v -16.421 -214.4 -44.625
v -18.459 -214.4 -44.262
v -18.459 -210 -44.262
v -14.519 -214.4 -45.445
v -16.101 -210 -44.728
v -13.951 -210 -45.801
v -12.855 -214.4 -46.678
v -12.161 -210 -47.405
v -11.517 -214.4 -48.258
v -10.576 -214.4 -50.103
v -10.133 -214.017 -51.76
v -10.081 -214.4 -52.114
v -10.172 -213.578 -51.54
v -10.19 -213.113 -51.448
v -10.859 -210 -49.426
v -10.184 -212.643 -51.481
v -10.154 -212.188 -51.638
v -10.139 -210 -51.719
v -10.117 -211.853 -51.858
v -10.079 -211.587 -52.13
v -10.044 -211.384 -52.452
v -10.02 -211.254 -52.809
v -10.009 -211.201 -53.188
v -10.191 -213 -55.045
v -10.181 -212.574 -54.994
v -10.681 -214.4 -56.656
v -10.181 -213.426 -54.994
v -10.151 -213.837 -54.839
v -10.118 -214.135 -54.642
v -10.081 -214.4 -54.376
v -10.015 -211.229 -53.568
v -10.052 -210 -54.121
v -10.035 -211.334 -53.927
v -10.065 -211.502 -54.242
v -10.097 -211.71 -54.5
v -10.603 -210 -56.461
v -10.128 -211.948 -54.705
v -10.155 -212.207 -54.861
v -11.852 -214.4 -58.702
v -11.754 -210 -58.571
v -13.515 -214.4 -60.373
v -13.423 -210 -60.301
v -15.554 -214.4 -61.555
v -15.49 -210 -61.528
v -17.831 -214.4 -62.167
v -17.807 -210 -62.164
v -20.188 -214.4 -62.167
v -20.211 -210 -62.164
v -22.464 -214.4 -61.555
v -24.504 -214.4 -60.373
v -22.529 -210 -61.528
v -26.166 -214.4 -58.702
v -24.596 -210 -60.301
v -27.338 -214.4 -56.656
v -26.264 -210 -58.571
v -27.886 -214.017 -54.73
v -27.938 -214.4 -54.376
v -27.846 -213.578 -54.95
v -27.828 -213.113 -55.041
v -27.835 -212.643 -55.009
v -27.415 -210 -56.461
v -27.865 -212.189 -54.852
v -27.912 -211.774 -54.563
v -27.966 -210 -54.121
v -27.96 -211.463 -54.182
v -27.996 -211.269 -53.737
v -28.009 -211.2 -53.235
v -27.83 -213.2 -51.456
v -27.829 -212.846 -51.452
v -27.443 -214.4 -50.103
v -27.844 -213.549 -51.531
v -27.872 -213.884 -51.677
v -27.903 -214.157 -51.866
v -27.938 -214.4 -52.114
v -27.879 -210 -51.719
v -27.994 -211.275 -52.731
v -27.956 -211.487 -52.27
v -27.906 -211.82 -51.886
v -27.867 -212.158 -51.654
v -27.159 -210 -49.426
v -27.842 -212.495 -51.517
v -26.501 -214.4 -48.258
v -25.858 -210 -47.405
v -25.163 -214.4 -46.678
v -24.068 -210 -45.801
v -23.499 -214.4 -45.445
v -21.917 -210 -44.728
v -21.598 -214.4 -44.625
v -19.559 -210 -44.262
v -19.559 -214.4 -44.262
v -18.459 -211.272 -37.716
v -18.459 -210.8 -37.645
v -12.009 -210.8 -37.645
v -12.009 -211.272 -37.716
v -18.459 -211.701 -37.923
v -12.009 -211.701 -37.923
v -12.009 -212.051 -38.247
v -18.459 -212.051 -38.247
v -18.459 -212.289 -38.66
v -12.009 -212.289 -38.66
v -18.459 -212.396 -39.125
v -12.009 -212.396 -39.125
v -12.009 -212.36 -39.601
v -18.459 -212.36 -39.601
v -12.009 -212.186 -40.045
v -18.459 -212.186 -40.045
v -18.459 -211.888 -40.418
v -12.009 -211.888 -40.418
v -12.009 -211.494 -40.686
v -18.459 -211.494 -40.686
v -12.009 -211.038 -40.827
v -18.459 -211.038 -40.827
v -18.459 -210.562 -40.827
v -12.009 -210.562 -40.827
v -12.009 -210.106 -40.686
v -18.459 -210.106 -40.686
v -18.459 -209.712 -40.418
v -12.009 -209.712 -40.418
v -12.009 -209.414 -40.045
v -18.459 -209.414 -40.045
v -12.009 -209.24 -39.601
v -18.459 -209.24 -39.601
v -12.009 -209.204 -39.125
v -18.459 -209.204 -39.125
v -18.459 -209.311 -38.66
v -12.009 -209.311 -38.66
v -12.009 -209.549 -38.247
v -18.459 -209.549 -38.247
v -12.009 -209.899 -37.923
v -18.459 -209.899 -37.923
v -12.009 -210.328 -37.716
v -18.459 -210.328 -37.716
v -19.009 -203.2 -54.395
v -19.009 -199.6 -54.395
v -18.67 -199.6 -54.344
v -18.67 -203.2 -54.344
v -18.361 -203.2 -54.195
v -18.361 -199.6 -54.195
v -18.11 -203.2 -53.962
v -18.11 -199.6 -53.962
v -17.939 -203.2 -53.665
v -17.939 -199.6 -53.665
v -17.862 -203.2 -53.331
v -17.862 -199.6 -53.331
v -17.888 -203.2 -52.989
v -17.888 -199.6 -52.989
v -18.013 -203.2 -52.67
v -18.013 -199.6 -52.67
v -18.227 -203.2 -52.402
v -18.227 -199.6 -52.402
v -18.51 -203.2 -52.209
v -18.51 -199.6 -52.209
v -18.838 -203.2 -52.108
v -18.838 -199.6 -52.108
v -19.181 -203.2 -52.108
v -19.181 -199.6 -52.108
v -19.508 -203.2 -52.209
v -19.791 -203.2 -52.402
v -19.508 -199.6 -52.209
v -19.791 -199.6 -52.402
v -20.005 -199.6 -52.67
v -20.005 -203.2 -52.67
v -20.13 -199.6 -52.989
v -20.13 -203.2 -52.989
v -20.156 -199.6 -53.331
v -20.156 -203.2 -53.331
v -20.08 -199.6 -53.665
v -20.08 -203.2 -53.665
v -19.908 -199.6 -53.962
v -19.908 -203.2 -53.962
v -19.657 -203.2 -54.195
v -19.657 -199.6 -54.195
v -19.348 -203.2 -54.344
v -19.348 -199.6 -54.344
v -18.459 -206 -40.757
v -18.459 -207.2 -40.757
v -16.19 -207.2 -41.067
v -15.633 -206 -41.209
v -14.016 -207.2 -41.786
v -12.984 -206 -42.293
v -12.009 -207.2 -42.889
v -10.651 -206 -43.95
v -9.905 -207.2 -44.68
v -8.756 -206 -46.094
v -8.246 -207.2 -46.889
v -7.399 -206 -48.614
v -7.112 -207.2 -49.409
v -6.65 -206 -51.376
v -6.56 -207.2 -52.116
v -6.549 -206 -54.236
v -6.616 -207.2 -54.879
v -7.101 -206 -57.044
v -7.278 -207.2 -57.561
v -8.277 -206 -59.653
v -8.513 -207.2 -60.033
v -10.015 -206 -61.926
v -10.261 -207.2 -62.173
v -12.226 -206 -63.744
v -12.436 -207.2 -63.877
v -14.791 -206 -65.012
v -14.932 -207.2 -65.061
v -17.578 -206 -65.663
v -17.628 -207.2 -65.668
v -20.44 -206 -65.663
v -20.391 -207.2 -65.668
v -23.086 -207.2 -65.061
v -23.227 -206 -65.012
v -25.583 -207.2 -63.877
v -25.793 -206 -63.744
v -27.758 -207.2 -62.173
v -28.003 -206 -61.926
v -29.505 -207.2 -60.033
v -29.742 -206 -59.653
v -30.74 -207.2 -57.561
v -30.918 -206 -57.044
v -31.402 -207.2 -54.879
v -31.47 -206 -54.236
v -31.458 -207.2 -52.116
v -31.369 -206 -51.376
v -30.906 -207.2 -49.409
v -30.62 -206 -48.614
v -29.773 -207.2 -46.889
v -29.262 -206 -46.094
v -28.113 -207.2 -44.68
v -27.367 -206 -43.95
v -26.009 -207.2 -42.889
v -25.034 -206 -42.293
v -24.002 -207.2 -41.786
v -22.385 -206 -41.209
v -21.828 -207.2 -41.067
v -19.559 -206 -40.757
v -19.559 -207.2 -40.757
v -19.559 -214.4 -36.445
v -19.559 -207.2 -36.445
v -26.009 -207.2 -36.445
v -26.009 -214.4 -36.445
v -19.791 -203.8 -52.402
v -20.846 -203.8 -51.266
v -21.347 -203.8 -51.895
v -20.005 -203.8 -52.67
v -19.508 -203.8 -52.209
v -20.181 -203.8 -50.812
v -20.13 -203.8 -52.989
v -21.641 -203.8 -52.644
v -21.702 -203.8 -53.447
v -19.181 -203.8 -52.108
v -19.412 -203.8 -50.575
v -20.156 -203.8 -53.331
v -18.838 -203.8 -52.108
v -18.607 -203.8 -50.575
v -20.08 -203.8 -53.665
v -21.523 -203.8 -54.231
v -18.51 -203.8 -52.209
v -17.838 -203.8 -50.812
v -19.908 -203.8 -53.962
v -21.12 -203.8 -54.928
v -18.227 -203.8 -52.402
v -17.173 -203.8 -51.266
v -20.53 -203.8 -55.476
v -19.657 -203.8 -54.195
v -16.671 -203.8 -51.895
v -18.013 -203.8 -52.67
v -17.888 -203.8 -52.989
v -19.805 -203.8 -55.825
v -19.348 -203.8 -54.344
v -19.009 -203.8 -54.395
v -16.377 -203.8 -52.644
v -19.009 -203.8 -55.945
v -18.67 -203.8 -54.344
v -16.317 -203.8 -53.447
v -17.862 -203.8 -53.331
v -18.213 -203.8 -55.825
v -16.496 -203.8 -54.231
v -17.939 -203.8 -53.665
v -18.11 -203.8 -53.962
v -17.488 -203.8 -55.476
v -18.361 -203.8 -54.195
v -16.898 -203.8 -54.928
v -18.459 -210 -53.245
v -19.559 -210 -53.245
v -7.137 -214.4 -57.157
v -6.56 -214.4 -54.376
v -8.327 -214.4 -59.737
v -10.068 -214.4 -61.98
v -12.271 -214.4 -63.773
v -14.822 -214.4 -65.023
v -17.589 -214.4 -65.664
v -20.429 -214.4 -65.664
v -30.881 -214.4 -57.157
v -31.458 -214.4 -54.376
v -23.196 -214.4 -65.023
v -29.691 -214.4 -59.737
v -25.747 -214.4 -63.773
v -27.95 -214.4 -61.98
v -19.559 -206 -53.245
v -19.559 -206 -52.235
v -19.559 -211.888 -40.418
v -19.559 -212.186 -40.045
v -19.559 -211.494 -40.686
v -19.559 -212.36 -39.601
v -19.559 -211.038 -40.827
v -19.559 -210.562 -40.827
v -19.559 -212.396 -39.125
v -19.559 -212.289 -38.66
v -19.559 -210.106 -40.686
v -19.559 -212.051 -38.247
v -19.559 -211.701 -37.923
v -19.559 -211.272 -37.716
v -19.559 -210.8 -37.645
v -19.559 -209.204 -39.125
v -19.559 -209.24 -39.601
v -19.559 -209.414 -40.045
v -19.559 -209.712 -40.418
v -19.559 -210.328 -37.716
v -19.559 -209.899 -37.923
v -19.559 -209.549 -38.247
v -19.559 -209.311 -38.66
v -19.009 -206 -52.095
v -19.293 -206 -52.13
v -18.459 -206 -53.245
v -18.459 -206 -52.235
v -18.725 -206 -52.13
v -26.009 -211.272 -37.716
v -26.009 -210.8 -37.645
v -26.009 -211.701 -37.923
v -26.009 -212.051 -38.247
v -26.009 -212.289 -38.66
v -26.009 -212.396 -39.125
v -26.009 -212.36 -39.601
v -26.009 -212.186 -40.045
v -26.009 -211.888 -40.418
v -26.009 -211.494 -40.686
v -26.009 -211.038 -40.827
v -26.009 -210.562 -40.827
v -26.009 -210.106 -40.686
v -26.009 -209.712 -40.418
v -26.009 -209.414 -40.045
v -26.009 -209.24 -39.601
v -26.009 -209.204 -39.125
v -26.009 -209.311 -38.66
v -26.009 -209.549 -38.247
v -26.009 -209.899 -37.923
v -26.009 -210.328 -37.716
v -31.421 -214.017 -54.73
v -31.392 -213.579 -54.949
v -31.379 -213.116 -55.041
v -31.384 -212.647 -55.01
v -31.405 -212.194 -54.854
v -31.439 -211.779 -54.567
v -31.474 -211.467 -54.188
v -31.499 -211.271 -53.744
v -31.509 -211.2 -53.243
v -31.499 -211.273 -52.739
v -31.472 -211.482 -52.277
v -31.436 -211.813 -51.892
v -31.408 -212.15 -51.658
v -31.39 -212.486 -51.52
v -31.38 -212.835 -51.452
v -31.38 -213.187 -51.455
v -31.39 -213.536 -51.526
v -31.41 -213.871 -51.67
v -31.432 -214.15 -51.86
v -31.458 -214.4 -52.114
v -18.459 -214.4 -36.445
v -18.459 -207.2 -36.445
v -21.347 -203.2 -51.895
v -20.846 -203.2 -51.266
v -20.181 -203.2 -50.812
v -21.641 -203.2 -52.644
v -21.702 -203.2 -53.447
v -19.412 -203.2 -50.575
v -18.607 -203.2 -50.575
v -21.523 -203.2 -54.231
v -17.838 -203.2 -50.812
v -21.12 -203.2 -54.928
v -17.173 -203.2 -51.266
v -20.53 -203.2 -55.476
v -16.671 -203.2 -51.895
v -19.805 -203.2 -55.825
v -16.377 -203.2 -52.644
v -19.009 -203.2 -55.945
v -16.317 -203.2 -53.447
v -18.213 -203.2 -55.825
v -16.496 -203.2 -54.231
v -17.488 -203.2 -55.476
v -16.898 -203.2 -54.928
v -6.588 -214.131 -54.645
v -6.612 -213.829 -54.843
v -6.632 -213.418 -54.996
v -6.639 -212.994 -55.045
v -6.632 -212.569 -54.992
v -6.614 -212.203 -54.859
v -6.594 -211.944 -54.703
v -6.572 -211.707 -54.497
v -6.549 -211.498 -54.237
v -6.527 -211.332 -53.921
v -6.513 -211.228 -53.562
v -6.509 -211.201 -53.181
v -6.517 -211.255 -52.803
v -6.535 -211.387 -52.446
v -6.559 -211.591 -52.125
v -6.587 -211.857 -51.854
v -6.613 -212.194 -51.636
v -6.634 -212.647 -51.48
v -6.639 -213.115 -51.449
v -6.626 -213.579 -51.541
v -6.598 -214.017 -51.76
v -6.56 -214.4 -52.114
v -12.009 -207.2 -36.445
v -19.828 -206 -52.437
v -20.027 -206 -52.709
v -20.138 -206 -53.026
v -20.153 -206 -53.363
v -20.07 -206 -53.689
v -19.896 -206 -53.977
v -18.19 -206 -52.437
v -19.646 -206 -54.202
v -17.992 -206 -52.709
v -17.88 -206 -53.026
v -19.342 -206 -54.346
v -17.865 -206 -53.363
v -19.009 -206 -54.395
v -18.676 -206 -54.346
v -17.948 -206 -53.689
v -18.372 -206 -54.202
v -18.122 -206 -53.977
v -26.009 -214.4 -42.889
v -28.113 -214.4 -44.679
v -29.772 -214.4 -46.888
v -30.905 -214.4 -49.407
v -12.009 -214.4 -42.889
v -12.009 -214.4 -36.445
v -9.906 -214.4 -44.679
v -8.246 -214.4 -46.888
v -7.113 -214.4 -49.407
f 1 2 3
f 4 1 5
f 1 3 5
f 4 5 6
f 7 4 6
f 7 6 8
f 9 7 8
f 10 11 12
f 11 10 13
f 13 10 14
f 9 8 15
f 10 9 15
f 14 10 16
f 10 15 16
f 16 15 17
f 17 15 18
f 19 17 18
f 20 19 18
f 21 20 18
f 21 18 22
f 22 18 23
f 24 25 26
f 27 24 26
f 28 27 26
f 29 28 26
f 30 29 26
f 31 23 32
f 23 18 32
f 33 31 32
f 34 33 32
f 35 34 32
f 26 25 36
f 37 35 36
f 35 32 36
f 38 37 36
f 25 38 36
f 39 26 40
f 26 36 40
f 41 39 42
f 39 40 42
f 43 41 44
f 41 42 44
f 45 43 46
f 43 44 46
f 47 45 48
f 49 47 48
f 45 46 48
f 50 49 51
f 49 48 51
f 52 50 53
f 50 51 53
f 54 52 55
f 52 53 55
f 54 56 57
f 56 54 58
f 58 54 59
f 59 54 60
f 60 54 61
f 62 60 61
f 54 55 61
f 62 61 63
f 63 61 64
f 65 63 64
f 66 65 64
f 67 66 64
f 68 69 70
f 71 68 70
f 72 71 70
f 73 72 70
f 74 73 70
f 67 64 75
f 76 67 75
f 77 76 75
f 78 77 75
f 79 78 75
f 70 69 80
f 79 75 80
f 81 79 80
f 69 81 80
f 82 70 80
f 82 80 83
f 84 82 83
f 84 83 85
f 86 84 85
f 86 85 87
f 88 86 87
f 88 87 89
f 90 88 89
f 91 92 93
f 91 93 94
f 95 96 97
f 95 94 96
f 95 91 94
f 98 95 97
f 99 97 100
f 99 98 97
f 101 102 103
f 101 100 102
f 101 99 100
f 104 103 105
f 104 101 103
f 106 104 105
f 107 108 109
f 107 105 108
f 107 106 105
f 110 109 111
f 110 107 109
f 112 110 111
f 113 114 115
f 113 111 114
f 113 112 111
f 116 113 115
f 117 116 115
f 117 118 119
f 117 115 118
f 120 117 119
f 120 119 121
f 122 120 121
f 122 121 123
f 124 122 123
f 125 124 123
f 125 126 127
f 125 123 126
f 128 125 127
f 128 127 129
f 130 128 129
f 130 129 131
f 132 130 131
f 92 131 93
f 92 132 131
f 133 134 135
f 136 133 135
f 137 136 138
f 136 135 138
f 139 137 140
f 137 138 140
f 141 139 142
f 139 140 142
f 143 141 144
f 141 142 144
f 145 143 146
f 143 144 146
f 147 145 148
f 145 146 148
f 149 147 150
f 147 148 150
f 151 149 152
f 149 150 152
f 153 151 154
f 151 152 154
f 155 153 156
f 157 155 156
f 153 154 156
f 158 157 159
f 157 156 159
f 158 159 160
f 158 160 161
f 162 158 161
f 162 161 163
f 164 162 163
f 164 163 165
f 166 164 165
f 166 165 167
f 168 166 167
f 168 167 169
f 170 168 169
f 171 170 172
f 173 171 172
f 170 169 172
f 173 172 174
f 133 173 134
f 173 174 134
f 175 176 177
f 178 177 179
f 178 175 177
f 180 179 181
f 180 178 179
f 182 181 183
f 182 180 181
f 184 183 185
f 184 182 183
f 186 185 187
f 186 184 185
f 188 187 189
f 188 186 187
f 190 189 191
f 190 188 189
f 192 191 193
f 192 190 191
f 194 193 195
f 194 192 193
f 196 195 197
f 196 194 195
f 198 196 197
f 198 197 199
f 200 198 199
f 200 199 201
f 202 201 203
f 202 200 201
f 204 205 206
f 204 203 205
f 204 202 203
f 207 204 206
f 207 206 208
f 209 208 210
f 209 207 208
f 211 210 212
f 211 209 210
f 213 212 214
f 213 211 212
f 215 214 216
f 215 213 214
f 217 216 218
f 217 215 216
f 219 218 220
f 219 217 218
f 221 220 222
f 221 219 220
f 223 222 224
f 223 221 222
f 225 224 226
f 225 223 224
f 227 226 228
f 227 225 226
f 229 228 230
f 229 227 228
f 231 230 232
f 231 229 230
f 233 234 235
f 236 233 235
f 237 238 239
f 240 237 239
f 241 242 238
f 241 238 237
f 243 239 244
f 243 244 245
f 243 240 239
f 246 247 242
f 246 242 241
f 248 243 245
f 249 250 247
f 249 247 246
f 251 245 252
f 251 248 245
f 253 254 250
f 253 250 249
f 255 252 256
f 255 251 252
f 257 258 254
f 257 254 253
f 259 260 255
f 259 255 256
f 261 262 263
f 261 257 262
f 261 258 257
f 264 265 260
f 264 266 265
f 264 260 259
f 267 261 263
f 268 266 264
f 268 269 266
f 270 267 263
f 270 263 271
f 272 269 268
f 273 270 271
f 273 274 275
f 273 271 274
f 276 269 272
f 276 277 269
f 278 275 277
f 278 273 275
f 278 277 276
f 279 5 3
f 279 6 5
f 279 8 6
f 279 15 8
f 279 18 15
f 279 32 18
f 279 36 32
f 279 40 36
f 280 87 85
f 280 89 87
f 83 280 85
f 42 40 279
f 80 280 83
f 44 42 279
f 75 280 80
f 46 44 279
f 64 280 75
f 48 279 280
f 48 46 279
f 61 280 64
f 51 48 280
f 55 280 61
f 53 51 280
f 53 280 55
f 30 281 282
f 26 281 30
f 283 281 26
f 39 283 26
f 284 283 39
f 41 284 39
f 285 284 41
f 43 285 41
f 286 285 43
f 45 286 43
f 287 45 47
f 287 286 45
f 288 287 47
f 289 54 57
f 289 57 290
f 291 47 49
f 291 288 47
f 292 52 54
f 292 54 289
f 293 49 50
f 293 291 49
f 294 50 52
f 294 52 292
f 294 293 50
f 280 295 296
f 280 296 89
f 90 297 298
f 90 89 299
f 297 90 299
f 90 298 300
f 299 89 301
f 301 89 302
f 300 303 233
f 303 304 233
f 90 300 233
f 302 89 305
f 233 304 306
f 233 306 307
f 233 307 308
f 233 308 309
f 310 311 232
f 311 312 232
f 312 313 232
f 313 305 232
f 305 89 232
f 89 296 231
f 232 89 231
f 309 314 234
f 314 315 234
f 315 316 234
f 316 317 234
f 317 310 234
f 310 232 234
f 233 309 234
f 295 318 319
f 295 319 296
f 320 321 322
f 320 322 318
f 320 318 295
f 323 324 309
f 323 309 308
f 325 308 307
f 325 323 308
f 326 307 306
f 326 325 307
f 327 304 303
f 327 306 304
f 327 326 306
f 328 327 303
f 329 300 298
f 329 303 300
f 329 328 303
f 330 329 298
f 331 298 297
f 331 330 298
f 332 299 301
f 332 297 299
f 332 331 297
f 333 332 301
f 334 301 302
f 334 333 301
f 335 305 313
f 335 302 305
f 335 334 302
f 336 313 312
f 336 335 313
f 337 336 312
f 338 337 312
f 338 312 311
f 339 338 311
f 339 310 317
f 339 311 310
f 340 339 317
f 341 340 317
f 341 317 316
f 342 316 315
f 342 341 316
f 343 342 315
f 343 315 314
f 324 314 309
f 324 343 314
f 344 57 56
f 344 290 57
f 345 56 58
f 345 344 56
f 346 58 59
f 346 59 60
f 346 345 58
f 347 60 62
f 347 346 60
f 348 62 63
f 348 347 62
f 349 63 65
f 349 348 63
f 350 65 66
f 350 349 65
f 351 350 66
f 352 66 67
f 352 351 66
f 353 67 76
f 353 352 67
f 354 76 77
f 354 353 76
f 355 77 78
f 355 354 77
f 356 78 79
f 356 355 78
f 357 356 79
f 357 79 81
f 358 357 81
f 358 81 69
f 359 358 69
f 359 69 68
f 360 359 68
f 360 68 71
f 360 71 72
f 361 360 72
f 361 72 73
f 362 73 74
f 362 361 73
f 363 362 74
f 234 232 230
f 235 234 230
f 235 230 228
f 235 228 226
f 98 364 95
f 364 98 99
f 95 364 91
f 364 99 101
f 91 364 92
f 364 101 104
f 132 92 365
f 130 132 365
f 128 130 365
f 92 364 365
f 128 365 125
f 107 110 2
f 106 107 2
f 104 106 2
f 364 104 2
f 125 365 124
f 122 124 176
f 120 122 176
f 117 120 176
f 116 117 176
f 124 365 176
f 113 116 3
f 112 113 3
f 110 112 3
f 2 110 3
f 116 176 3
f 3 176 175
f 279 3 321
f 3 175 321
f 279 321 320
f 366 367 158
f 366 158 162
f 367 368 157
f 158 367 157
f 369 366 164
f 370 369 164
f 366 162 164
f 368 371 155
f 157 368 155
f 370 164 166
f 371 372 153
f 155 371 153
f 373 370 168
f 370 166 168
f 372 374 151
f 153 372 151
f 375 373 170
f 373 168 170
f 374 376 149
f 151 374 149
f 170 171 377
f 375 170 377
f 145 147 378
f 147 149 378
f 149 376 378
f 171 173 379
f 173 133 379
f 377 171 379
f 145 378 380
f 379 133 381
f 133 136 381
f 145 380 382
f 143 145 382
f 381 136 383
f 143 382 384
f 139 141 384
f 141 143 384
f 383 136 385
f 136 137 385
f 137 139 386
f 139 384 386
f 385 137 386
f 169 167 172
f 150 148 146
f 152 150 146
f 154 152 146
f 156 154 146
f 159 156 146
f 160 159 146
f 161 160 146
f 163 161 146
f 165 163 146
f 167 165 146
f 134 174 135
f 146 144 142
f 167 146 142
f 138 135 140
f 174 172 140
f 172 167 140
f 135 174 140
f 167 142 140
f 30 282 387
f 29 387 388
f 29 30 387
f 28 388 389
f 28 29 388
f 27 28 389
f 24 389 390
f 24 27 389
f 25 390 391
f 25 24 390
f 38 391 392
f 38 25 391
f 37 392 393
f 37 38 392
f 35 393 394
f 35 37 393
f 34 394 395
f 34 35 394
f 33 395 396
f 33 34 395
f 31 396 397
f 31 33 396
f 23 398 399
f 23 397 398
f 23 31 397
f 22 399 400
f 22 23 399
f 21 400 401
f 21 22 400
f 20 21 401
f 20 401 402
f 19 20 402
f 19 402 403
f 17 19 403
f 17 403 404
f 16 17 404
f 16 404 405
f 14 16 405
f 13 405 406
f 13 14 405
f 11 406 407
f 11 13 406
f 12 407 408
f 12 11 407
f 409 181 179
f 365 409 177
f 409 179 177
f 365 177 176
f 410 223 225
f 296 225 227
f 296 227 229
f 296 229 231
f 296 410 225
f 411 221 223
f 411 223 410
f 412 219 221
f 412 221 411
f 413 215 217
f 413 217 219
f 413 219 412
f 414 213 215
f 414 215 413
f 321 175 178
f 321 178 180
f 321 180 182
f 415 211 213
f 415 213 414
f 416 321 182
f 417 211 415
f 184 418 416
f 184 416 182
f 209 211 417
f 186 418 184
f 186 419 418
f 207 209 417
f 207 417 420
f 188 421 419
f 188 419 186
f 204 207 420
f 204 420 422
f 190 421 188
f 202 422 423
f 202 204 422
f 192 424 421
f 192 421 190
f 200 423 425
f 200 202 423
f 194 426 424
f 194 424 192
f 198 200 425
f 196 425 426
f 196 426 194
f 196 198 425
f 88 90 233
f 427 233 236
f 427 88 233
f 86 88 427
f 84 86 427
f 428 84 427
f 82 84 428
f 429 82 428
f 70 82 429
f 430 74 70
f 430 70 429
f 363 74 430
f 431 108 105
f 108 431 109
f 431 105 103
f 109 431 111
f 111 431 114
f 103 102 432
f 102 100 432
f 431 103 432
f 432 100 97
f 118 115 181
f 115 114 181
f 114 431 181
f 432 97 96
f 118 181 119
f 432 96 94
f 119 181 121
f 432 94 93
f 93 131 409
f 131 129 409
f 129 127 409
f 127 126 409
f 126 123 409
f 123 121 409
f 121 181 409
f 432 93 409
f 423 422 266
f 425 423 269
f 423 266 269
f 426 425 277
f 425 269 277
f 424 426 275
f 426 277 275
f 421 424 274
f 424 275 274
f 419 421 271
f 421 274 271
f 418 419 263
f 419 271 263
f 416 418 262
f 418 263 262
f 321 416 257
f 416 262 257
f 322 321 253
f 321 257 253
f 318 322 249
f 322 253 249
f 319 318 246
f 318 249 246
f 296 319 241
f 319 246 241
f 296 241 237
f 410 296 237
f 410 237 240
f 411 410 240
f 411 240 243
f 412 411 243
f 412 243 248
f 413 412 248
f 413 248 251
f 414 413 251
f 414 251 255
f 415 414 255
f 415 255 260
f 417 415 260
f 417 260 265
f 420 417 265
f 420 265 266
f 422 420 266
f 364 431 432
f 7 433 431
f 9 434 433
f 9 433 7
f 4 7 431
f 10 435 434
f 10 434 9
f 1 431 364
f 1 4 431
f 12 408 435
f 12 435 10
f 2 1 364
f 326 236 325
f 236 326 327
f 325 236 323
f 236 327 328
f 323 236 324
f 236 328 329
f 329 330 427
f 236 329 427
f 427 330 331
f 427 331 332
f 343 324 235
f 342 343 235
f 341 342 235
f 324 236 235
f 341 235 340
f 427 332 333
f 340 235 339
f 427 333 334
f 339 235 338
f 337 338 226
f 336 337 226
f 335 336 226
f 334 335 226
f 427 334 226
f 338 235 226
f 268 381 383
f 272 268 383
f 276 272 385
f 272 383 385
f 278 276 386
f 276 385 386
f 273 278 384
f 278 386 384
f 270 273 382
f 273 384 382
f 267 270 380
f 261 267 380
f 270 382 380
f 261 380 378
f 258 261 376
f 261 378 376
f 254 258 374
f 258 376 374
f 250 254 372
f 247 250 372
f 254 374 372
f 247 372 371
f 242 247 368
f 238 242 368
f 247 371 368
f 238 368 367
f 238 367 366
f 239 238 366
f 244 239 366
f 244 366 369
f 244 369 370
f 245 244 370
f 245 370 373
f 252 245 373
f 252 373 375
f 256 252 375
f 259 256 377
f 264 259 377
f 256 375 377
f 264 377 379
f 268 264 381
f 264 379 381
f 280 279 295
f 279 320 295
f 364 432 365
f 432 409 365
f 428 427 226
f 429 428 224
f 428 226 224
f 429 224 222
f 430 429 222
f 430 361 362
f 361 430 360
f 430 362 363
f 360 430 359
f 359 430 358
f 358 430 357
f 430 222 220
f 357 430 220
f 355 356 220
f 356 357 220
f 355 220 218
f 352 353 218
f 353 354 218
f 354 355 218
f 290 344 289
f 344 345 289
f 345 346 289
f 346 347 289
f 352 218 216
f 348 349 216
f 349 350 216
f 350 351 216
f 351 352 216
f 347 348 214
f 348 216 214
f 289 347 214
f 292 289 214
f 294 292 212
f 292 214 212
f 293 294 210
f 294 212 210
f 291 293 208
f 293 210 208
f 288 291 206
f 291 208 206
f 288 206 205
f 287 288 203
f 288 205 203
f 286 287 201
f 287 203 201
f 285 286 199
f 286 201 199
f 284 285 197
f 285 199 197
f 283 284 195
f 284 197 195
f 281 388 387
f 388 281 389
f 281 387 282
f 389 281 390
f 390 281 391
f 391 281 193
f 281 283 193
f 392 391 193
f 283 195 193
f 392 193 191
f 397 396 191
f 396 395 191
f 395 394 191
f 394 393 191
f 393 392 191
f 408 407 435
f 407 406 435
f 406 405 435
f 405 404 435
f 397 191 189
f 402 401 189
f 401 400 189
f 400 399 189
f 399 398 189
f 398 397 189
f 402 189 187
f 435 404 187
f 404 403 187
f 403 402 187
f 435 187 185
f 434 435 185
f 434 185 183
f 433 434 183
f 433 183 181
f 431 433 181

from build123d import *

# Parameters (mm, degrees)
MAIN_PROFILE_SKETCH_R          = 1.15
MAIN_EXTRUSION_DEPTH           = 3.6
DETAIL_PROFILE_2_SKETCH_R      = 2.7
DETAIL_EXTRUSION_2_DEPTH       = 0.6
DETAIL_PROFILE_3_SKETCH_R      = 1.15
DETAIL_EXTRUSION_3_DEPTH       = 2.2
DETAIL_EXTRUSION_4_DEPTH       = 1.2
DETAIL_EXTRUSION_5_DEPTH       = 2.8
DETAIL_EXTRUSION_6_DEPTH       = 4.4
ADAPTER_CROSS_BORE_1_PROFILE_R = 1.8
ADAPTER_CROSS_BORE_1_DEPTH     = 28
ADAPTER_CROSS_BORE_2_PROFILE_R = 1.6
ADAPTER_CROSS_BORE_2_DEPTH     = 16


with BuildPart() as part:
    # Main Profile Sketch → Main Extrusion (new body)
    with BuildSketch(Plane(origin=(0, -199.6, 0), x_dir=(-1, 0, 0), z_dir=(0, -1, 0))):
        with Locations(Location((19.009182883, 53.244882879, 0), (0, 0, 90))):
            Circle(MAIN_PROFILE_SKETCH_R)
    extrude(amount=MAIN_EXTRUSION_DEPTH)

    # Detail Profile 2 Sketch → Detail Extrusion 2 (add)
    with BuildSketch(Plane(origin=(0, -203.2, 0), x_dir=(-1, 0, 0), z_dir=(0, -1, 0))):
        with Locations(Location((19.009182883, 53.244882879, 0), (0, 0, 90))):
            Circle(DETAIL_PROFILE_2_SKETCH_R)
    extrude(amount=DETAIL_EXTRUSION_2_DEPTH)

    # Detail Profile 3 Sketch → Detail Extrusion 3 (add)
    with BuildSketch(Plane(origin=(0, -203.8, 0), x_dir=(-1, 0, 0), z_dir=(0, -1, 0))):
        with Locations(Location((19.009182883, 53.244882879, 0), (0, 0, 90))):
            Circle(DETAIL_PROFILE_3_SKETCH_R)
    extrude(amount=DETAIL_EXTRUSION_3_DEPTH)

    # Detail Profile 4 Sketch → Detail Extrusion 4 (add)
    with BuildSketch(Plane(origin=(0, -206, 0), x_dir=(-1, 0, 0), z_dir=(0, -1, 0))):
        with BuildLine():
            Line((18.459182883, 53.244882879), (18.459182883, 40.756988741))
            ThreePointArc((18.459182883, 40.756988741), (19.009182883, 65.744882879), (19.559182883, 40.756988741))
            Line((19.559182883, 40.756988741), (19.559182883, 53.244882879))
            Line((19.559182883, 53.244882879), (18.459182883, 53.244882879))
        make_face()
    extrude(amount=DETAIL_EXTRUSION_4_DEPTH)

    # Detail Profile 5 Sketch → Detail Extrusion 5 (add)
    with BuildSketch(Plane(origin=(0, -207.2, 0), x_dir=(-1, 0, 0), z_dir=(0, -1, 0))):
        with BuildLine():
            Line((12.009182883, 42.88872529), (12.009182883, 36.444882879))
            Line((12.009182883, 36.444882879), (18.459182883, 36.444882879))
            Line((18.459182883, 36.444882879), (18.459182883, 53.244882879))
            Line((18.459182883, 53.244882879), (19.559182883, 53.244882879))
            Line((19.559182883, 53.244882879), (19.559182883, 36.444882879))
            Line((19.559182883, 36.444882879), (26.009182883, 36.444882879))
            Line((26.009182883, 36.444882879), (26.009182883, 42.88872529))
            ThreePointArc((26.009182883, 42.88872529), (19.009182883, 65.744882879), (12.009182883, 42.88872529))
        make_face()
    extrude(amount=DETAIL_EXTRUSION_5_DEPTH)

    # Detail Profile 6 Sketch → Detail Extrusion 6 (add)
    with BuildSketch(Plane(origin=(0, -210, 0), x_dir=(-1, 0, 0), z_dir=(0, -1, 0))):
        with BuildLine():
            Line((12.009182883, 42.88872529), (12.009182883, 36.444882879))
            Line((12.009182883, 36.444882879), (18.459182883, 36.444882879))
            Line((18.459182883, 36.444882879), (18.459182883, 44.261704154))
            ThreePointArc((18.459182883, 44.261704154), (19.009182883, 62.244882879), (19.559182883, 44.261704154))
            Line((19.559182883, 44.261704154), (19.559182883, 36.444882879))
            Line((19.559182883, 36.444882879), (26.009182883, 36.444882879))
            Line((26.009182883, 36.444882879), (26.009182883, 42.88872529))
            ThreePointArc((26.009182883, 42.88872529), (19.009182883, 65.744882879), (12.009182883, 42.88872529))
        make_face()
    extrude(amount=DETAIL_EXTRUSION_6_DEPTH)

    # Adapter Cross Bore 1 profile → Adapter Cross Bore 1 (cut)
    with BuildSketch(Plane(origin=(-33.009182883, 0, 0), x_dir=(0, 0, -1), z_dir=(1, 0, 0))):
        with Locations((53.244882879, -213)):
            Circle(ADAPTER_CROSS_BORE_1_PROFILE_R)
    extrude(amount=ADAPTER_CROSS_BORE_1_DEPTH, mode=Mode.SUBTRACT)

    # Adapter Cross Bore 2 profile → Adapter Cross Bore 2 (cut)
    with BuildSketch(Plane(origin=(-27.009182883, 0, 0), x_dir=(0, 0, -1), z_dir=(1, 0, 0))):
        with Locations(Location((39.244882879, -210.8, 0), (0, 0, 180))):
            Circle(ADAPTER_CROSS_BORE_2_PROFILE_R)
    extrude(amount=ADAPTER_CROSS_BORE_2_DEPTH, mode=Mode.SUBTRACT)


solid = part.part
